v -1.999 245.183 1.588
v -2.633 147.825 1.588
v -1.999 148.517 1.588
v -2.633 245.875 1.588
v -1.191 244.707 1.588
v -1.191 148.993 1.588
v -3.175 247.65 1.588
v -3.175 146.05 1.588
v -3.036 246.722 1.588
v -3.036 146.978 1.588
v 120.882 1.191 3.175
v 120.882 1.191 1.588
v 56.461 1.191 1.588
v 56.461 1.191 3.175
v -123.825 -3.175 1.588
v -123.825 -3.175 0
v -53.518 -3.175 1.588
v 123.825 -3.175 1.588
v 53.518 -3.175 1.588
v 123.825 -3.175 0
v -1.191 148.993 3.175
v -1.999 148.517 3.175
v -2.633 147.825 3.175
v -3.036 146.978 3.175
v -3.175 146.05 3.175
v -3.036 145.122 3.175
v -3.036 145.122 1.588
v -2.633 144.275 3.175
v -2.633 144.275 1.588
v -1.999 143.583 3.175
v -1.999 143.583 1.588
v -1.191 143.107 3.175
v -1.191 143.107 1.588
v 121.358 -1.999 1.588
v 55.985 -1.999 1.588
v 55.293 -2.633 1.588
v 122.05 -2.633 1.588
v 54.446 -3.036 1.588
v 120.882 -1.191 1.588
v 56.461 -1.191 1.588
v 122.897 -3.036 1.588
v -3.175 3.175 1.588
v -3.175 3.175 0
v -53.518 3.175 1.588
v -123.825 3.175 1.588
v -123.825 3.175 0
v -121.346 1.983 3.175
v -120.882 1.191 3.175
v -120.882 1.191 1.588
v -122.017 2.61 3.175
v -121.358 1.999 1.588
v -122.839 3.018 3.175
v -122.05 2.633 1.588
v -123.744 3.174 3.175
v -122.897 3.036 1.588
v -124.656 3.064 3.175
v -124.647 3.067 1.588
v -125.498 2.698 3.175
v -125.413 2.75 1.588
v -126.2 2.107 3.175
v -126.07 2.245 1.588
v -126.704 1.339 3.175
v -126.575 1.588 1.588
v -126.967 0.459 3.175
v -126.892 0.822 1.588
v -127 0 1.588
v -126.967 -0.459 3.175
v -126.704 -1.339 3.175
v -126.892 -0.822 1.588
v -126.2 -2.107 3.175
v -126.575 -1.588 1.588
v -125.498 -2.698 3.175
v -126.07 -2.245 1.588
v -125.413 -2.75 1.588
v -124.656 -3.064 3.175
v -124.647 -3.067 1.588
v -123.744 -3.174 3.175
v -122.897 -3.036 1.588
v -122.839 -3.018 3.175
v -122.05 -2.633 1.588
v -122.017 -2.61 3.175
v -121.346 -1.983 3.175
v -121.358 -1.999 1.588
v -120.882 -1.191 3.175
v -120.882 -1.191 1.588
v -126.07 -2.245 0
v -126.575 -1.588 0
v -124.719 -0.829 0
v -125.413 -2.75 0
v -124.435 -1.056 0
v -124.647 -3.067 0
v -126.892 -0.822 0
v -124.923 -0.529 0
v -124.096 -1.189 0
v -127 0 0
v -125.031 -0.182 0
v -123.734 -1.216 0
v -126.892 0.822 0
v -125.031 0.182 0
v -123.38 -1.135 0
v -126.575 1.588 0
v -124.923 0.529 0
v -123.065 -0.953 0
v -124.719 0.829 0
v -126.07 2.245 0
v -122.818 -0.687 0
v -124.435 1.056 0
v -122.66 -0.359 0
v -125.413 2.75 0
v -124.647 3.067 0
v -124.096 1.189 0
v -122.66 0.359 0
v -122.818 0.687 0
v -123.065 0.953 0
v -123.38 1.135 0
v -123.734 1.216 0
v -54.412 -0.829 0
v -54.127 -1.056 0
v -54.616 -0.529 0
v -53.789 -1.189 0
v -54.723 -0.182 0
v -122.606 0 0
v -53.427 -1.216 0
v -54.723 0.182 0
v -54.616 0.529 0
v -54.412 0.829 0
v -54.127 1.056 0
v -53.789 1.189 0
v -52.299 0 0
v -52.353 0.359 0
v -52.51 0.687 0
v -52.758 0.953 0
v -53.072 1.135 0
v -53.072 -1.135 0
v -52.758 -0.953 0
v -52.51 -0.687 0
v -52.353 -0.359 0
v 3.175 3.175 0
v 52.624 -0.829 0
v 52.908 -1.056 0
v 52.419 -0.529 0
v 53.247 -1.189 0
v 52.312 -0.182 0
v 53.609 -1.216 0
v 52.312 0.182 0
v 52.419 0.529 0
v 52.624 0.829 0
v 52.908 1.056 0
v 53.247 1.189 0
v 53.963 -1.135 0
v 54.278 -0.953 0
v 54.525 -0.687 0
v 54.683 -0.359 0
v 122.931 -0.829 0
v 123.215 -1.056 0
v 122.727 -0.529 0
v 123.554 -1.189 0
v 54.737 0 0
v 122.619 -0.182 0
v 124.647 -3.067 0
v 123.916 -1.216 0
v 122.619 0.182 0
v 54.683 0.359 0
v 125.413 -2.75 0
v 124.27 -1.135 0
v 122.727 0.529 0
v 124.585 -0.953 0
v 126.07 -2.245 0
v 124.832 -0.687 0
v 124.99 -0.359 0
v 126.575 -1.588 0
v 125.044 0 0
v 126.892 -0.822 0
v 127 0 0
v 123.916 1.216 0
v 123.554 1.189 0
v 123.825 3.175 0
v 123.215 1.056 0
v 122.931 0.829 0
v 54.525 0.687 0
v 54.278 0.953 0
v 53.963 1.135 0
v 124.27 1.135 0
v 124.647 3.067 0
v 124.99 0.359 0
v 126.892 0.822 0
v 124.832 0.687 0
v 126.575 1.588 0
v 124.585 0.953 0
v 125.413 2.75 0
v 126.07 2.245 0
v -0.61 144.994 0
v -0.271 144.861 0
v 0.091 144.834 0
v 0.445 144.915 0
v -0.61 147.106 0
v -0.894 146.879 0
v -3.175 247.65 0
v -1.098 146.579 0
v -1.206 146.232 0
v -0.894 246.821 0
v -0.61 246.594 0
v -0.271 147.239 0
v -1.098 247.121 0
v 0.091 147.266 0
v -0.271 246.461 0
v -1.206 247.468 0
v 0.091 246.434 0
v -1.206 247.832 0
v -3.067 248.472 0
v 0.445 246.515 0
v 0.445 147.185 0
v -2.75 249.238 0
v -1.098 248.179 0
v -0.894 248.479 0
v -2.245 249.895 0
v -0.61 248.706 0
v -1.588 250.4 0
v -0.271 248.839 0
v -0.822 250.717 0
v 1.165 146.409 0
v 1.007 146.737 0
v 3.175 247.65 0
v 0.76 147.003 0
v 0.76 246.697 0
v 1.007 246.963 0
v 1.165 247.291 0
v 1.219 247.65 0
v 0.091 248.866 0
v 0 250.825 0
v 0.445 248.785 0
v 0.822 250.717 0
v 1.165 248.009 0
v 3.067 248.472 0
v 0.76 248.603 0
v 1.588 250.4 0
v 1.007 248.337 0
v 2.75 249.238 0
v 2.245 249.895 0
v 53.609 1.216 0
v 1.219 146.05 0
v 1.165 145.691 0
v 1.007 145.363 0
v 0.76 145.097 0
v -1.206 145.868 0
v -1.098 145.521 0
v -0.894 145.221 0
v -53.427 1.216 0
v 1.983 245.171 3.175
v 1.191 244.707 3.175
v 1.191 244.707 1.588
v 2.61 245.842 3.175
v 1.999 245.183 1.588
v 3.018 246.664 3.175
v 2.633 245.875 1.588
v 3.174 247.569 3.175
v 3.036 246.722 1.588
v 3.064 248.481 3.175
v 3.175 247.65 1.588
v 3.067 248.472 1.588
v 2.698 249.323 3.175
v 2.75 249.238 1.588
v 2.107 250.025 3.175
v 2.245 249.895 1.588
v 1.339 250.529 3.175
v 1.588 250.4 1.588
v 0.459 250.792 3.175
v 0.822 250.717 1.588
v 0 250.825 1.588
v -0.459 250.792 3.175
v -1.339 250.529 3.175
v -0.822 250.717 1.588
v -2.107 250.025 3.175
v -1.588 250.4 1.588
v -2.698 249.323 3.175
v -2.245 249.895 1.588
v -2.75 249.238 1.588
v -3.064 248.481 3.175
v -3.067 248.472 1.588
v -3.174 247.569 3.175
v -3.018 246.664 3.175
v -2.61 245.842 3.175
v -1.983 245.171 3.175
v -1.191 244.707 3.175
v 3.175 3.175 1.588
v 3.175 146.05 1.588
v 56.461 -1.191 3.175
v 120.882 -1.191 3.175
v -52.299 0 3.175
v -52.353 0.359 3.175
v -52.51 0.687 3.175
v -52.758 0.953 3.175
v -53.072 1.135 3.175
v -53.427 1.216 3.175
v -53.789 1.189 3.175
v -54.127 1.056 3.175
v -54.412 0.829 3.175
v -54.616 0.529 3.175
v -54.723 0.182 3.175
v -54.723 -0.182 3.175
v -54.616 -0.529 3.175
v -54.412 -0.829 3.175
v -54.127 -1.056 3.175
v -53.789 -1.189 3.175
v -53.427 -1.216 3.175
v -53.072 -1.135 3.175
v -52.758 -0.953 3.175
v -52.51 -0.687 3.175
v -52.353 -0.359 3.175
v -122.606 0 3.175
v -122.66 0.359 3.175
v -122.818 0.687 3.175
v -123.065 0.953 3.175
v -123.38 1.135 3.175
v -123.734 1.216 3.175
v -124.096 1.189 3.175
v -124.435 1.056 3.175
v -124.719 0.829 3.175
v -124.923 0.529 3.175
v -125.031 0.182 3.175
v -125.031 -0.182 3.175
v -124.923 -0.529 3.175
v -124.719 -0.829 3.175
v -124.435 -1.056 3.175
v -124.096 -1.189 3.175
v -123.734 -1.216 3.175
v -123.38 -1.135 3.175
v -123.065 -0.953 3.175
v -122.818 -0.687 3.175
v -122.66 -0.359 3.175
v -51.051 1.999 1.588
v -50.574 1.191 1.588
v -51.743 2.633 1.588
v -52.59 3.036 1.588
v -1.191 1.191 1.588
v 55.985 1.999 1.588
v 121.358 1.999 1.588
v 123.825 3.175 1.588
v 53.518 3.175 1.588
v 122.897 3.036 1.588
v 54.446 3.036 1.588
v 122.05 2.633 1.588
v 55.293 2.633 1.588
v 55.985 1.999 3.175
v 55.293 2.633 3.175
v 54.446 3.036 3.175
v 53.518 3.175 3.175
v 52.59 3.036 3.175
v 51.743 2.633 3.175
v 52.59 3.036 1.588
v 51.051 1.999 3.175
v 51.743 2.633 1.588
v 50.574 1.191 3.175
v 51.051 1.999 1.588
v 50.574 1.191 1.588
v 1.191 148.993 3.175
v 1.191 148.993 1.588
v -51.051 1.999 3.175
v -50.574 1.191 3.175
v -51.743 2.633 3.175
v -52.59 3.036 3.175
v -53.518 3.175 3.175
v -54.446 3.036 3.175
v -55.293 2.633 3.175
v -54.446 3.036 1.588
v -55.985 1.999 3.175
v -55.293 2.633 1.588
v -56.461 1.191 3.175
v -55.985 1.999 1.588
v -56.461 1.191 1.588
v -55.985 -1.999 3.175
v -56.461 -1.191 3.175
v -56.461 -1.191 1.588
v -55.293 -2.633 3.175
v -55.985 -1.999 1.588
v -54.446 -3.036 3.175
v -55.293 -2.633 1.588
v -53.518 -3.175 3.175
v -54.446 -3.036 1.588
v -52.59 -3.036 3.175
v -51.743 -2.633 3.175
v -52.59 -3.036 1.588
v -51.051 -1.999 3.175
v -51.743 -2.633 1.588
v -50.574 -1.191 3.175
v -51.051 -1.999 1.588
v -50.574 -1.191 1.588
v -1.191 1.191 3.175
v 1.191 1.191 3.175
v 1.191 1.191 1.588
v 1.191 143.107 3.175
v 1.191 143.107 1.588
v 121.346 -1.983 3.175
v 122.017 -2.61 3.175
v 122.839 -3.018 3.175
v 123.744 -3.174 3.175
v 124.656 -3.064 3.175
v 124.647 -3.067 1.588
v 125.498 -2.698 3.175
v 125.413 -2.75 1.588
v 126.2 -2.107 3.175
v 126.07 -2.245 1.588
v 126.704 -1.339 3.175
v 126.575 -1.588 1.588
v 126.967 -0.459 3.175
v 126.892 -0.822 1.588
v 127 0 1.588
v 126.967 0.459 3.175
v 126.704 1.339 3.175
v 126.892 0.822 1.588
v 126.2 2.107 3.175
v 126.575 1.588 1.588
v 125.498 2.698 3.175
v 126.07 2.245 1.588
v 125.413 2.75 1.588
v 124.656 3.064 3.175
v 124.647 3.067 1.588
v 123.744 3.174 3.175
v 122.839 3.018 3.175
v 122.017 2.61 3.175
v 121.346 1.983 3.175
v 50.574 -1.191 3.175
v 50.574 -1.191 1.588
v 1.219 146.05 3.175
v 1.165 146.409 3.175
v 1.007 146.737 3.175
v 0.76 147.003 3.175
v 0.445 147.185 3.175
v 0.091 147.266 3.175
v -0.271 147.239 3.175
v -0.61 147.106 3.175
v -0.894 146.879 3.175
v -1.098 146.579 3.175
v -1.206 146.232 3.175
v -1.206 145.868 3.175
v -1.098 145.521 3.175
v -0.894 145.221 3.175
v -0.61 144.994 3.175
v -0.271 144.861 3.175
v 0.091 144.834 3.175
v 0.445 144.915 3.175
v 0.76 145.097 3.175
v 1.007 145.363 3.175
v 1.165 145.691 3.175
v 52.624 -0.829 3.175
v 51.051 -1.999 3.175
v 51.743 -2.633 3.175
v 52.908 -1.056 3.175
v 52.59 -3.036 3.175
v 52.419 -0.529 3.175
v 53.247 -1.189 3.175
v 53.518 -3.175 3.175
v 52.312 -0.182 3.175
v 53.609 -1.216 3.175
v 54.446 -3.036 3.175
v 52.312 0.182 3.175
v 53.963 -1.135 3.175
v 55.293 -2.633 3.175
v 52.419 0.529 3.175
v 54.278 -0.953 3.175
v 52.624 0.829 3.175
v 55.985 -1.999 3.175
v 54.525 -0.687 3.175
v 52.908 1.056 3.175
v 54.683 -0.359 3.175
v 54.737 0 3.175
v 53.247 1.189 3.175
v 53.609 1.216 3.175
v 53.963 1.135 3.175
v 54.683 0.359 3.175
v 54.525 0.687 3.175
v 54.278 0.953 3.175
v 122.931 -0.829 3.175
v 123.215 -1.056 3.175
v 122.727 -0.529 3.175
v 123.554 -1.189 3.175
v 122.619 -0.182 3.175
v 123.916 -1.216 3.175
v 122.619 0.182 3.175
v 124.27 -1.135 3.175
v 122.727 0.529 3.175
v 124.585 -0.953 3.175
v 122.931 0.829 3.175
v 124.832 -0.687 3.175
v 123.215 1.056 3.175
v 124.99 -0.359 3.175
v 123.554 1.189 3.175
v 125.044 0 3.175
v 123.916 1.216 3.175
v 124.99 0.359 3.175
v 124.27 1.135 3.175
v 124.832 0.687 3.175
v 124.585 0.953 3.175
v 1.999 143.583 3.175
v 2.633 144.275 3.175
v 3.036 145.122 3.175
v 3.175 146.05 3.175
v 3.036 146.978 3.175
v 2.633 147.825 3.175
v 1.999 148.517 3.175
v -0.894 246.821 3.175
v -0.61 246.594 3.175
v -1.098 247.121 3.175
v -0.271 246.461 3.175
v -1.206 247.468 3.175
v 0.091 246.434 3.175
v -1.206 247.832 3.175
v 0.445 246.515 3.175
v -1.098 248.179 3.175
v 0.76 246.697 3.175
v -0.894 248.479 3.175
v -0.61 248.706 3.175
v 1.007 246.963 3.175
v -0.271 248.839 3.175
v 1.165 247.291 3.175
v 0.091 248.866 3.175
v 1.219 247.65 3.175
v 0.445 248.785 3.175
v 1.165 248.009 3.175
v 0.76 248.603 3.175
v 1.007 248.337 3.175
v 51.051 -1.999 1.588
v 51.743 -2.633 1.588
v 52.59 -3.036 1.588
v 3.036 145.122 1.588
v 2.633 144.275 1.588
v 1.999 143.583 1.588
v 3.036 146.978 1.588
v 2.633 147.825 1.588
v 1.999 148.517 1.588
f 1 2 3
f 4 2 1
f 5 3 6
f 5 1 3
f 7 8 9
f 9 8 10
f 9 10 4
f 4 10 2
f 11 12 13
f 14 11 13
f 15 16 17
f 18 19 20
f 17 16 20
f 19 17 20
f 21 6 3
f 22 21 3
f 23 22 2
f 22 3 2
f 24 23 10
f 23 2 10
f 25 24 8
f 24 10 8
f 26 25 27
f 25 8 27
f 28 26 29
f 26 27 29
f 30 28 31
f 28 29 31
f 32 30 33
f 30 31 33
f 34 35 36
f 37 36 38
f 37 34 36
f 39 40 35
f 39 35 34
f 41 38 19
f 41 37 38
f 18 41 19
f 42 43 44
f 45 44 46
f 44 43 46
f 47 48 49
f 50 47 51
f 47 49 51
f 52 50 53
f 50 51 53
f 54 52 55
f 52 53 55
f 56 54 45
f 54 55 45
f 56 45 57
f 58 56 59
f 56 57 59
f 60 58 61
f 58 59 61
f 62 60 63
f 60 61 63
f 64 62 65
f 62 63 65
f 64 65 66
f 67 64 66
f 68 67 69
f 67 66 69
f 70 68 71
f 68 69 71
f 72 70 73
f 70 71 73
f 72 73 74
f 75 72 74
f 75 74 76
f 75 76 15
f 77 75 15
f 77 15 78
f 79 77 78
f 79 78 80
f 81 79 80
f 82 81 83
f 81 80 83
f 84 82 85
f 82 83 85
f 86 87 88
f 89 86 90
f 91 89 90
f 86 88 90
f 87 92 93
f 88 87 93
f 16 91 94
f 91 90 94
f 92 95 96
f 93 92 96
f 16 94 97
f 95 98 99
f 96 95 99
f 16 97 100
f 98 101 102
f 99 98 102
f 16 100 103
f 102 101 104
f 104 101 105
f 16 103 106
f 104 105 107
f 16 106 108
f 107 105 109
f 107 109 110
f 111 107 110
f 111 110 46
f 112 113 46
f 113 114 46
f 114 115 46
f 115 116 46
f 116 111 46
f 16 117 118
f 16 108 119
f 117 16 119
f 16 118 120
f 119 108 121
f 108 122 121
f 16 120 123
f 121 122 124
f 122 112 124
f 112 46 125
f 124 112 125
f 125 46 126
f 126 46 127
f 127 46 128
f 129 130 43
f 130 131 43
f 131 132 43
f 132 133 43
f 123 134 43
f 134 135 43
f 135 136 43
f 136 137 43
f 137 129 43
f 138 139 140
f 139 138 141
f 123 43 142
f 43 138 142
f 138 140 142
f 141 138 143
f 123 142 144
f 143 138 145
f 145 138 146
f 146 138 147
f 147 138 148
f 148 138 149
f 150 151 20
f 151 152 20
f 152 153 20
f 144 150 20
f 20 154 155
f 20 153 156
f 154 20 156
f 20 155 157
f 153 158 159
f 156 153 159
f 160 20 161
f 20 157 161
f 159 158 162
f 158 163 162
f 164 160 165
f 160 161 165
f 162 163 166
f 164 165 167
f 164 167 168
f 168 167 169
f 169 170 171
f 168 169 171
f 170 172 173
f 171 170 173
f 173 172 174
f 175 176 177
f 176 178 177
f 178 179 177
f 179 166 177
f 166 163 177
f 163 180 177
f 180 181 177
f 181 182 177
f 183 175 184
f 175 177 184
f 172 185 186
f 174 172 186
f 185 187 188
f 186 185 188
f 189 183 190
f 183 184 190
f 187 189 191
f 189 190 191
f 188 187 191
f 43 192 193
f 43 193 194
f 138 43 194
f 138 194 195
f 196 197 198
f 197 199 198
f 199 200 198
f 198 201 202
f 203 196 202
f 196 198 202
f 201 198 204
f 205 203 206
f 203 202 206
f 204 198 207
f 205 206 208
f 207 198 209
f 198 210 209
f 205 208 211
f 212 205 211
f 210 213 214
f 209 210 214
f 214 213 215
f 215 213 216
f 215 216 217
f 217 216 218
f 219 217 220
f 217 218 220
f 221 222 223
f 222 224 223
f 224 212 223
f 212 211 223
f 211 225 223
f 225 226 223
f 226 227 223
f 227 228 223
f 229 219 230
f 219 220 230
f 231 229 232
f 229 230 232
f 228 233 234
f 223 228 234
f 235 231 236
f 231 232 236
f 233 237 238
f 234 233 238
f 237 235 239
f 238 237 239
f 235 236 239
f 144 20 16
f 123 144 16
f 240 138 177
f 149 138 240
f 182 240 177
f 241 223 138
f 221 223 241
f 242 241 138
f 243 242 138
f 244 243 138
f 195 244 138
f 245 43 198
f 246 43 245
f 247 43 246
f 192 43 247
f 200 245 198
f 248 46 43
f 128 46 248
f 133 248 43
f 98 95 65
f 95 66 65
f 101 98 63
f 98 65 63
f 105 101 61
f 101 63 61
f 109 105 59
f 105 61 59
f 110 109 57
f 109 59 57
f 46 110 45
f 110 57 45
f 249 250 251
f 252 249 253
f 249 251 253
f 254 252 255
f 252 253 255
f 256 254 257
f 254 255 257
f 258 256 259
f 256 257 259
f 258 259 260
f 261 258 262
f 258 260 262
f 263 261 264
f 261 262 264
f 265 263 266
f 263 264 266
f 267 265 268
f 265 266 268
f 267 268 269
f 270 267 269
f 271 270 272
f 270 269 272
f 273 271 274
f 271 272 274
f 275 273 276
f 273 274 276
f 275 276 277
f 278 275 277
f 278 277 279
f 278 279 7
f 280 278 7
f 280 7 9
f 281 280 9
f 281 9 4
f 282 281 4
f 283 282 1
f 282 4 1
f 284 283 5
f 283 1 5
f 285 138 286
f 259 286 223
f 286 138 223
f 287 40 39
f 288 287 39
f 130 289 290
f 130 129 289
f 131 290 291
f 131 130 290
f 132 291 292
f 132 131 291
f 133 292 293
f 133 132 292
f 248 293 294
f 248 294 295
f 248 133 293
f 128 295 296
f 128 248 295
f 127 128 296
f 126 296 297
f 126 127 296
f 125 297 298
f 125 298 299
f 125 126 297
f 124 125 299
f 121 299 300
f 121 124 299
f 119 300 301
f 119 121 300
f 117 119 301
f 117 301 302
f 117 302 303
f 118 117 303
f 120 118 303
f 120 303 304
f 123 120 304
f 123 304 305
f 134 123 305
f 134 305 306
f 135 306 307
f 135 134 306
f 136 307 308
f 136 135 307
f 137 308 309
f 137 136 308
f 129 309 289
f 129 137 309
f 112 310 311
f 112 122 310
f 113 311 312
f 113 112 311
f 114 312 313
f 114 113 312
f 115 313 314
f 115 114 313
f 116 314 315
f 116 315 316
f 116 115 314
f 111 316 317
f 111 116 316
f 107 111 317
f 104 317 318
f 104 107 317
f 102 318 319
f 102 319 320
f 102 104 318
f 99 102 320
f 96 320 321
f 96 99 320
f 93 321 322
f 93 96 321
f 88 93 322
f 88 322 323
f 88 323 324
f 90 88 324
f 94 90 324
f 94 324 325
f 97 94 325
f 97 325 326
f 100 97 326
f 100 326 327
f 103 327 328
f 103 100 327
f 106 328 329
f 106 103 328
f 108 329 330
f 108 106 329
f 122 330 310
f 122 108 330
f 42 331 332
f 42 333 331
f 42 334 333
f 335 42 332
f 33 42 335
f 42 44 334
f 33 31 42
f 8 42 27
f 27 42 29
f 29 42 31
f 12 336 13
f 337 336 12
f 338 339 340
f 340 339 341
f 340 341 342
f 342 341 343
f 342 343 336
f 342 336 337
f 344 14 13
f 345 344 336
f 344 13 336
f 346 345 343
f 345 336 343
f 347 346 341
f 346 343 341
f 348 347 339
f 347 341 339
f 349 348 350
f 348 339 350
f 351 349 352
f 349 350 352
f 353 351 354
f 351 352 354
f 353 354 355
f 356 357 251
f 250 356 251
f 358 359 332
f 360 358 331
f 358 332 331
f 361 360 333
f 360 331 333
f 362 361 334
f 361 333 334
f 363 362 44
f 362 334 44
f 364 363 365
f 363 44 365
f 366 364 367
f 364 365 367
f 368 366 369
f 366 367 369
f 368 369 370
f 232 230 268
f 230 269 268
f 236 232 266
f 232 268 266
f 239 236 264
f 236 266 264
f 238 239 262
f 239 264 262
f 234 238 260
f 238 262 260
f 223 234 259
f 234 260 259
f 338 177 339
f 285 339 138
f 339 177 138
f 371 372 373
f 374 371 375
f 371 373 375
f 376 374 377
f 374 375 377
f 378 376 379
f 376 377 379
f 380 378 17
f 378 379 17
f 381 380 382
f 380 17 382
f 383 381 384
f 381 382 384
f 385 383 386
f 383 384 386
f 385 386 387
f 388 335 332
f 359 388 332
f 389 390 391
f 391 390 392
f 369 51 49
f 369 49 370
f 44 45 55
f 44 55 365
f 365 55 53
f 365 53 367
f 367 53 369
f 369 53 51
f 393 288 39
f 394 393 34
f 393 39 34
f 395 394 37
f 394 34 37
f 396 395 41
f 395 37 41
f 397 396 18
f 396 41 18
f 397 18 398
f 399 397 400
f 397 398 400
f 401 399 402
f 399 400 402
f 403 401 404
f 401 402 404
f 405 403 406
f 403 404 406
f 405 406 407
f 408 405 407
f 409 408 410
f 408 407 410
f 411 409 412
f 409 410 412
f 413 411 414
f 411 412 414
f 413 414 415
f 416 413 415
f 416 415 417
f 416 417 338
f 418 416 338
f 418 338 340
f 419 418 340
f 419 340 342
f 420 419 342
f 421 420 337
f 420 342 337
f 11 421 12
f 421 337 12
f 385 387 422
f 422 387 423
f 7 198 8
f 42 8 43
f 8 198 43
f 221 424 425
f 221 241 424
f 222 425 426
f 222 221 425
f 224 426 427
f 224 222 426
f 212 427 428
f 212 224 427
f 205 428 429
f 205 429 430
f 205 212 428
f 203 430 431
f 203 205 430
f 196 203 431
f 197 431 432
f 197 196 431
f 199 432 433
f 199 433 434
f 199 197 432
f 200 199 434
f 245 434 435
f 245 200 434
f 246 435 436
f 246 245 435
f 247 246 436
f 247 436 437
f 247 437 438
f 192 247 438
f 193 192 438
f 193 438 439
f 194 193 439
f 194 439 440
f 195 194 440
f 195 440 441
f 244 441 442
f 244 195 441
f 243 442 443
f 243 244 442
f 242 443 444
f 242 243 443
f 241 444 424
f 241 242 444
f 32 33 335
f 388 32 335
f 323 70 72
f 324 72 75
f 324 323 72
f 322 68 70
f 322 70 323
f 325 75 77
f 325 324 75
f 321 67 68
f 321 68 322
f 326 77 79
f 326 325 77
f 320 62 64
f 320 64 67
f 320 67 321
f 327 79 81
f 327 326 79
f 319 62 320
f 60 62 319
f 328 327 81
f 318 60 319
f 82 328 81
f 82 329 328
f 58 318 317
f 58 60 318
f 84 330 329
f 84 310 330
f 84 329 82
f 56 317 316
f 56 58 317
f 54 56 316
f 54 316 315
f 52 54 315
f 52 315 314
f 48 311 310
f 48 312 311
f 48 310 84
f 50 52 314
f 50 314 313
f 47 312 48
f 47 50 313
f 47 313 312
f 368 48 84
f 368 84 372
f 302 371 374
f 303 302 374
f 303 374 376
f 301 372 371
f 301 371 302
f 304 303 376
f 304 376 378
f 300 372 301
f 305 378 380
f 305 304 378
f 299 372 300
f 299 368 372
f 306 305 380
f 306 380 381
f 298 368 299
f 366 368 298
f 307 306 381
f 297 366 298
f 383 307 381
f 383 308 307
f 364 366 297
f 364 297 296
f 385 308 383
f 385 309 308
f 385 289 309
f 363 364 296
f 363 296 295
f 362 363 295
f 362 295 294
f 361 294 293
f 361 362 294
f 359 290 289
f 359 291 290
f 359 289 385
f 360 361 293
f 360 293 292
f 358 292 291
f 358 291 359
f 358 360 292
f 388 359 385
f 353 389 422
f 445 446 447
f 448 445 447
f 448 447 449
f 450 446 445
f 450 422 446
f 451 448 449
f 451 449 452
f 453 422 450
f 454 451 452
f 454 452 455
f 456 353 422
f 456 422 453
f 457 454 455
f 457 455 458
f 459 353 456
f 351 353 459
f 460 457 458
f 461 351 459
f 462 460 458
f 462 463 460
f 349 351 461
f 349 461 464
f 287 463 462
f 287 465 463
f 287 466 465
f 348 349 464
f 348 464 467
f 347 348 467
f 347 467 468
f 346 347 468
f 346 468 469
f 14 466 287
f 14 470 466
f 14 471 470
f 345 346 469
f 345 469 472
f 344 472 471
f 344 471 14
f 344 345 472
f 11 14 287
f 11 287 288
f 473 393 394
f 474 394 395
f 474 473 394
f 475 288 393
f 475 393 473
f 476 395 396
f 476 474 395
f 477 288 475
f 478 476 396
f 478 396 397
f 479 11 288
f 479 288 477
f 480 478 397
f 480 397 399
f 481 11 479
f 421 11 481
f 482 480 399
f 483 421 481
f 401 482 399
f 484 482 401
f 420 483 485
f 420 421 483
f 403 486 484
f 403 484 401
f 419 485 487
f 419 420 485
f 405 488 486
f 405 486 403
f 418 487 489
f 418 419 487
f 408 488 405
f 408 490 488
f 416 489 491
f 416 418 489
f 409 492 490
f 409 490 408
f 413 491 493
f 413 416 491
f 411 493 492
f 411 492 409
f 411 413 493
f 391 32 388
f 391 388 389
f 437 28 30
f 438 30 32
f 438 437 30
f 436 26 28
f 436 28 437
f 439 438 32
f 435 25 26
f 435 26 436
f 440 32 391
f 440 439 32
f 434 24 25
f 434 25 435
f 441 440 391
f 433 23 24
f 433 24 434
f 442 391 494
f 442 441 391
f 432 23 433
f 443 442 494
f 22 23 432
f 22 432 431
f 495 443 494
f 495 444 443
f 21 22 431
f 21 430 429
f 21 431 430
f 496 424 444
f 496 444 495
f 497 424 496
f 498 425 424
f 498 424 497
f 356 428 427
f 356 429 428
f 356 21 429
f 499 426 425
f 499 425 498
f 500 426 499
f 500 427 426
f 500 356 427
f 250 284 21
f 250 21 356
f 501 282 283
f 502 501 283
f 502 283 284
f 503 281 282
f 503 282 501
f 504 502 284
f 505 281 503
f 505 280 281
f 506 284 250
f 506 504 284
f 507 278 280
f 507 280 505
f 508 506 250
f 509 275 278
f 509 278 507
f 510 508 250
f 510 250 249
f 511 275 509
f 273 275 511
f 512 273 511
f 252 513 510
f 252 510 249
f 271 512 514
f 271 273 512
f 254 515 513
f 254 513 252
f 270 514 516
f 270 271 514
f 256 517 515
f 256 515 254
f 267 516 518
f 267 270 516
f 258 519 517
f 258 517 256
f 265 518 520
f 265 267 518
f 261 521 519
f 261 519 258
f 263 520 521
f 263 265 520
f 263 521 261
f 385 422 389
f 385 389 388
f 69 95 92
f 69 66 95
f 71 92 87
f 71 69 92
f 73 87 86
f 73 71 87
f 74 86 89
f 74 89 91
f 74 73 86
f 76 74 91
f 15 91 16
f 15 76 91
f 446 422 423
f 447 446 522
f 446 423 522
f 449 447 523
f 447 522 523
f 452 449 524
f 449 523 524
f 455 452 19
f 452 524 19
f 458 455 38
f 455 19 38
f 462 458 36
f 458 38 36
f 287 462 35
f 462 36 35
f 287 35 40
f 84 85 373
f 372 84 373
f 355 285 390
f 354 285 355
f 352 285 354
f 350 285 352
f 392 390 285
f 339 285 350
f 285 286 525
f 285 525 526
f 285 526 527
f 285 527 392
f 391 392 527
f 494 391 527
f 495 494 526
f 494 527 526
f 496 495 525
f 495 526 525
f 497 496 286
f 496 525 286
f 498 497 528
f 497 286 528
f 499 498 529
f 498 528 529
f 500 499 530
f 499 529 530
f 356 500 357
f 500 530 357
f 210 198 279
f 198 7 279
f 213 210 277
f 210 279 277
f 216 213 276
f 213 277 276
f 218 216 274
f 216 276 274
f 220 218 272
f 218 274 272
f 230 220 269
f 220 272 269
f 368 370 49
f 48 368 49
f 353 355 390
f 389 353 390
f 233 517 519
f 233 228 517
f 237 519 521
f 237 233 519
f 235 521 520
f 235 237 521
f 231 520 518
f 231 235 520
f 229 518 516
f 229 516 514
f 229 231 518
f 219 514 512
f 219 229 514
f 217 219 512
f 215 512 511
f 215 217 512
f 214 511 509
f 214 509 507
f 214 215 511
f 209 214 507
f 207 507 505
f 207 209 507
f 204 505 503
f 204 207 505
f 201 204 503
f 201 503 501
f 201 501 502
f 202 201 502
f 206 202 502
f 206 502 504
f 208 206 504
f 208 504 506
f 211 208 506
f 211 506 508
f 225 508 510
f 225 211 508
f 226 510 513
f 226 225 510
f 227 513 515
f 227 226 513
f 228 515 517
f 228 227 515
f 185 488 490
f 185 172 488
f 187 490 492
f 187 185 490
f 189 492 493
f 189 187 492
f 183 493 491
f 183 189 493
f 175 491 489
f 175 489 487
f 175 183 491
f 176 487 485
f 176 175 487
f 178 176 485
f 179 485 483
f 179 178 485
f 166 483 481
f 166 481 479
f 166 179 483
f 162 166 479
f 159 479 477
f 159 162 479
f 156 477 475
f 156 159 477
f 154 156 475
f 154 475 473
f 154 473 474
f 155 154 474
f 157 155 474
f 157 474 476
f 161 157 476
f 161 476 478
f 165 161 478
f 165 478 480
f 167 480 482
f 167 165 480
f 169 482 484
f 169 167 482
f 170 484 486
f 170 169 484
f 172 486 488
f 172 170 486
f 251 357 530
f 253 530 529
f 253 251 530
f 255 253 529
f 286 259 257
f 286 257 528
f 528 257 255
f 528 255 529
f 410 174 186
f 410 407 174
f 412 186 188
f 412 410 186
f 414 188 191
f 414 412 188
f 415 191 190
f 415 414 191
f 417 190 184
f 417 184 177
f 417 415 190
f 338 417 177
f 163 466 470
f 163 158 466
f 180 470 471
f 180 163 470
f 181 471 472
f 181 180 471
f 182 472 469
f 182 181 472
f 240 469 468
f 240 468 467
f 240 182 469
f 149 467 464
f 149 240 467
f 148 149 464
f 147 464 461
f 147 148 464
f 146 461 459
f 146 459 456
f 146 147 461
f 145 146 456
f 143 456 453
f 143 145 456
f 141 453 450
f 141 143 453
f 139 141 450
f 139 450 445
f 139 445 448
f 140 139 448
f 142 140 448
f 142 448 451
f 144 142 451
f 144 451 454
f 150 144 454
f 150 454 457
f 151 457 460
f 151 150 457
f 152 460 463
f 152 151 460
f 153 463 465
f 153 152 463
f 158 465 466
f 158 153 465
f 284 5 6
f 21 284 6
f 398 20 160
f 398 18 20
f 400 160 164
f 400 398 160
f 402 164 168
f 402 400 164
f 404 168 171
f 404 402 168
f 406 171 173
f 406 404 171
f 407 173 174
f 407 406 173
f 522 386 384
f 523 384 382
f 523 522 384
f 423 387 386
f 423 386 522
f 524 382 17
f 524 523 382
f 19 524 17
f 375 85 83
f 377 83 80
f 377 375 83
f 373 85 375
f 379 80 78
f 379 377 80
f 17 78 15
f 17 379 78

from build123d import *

# Parameters (mm, degrees)
F0_R     = 1.2192
F1_DEPTH = 1.5875
F2_R     = 3.17499
F3_R     = 1.2192
F4_DEPTH = 1.5875


# Not quite as in the source:
# - a fillet or chamfer is up to 0.001 mm smaller than in the source, because OpenCascade refuses the exact size


with BuildPart() as f1:
    # F0 (on Top) → F1 (new body)
    with BuildSketch(Plane.XY):
        Polygon((-127, 3.175), (-127, -3.175), (127, -3.175), (127, 3.175), (3.175, 3.175), (3.175, 250.825), (-3.175, 250.825), (-3.175, 3.175), align=None)
        with Locations((-123.825, 0)):
            Circle(F0_R, mode=Mode.SUBTRACT)
        with Locations((-53.5178, 0)):
            Circle(F0_R, mode=Mode.SUBTRACT)
        with Locations((53.5178, 0)):
            Circle(F0_R, mode=Mode.SUBTRACT)
        with Locations((123.825, 0)):
            Circle(F0_R, mode=Mode.SUBTRACT)
        with Locations((0, 146.05)):
            Circle(F0_R, mode=Mode.SUBTRACT)
        with Locations((0, 247.65)):
            Circle(F0_R, mode=Mode.SUBTRACT)
    extrude(amount=F1_DEPTH)

    # F2 (radius 3.175 in the source; OpenCascade refuses exactly that, so slightly less here)
    f2_edges = [f1.edges().sort_by_distance(p)[0] for p in [
        (-127, -3.175, 0.79375),
        (-127, 3.175, 0.79375),
        (127, 3.175, 0.79375),
        (127, -3.175, 0.79375),
        (-3.175, 250.825, 0.79375),
        (3.175, 250.825, 0.79375),
    ]]
    fillet(f2_edges, radius=F2_R)

    # F3 (on face) → F4 (join)
    with BuildSketch(Plane.XY.offset(1.5875)):
        with BuildLine():
            Line((-56.4611037746, 1.190625), (-120.8816962254, 1.190625))
            ThreePointArc((-120.8816962254, 1.190625), (-127, 0), (-120.8816962254, -1.190625))
            Line((-120.8816962254, -1.190625), (-56.4611037746, -1.190625))
            ThreePointArc((-56.4611037746, -1.190625), (-53.5178, -3.175), (-50.5744962254, -1.190625))
            Line((-50.5744962254, -1.190625), (50.5744962254, -1.190625))
            ThreePointArc((50.5744962254, -1.190625), (53.5178, -3.175), (56.4611037746, -1.190625))
            Line((56.4611037746, -1.190625), (120.8816962254, -1.190625))
            ThreePointArc((120.8816962254, -1.190625), (127, 0), (120.8816962254, 1.190625))
            Line((120.8816962254, 1.190625), (56.4611037746, 1.190625))
            ThreePointArc((56.4611037746, 1.190625), (53.5178, 3.175), (50.5744962254, 1.190625))
            Line((50.5744962254, 1.190625), (1.190625, 1.190625))
            Line((1.190625, 1.190625), (1.190625, 143.1066962254))
            ThreePointArc((1.190625, 143.1066962254), (3.175, 146.05), (1.190625, 148.9933037746))
            Line((1.190625, 148.9933037746), (1.190625, 244.7066962254))
            ThreePointArc((1.190625, 244.7066962254), (0, 250.825), (-1.190625, 244.7066962254))
            Line((-1.190625, 244.7066962254), (-1.190625, 148.9933037746))
            ThreePointArc((-1.190625, 148.9933037746), (-3.175, 146.05), (-1.190625, 143.1066962254))
            Line((-1.190625, 143.1066962254), (-1.190625, 1.190625))
            Line((-1.190625, 1.190625), (-50.5744962254, 1.190625))
            ThreePointArc((-50.5744962254, 1.190625), (-53.5178, 3.175), (-56.4611037746, 1.190625))
        make_face()
        with Locations((-123.825, 0)):
            Circle(F3_R, mode=Mode.SUBTRACT)
        with Locations((-53.5178, 0)):
            Circle(F3_R, mode=Mode.SUBTRACT)
        with Locations((53.5178, 0)):
            Circle(F3_R, mode=Mode.SUBTRACT)
        with Locations((123.825, 0)):
            Circle(F3_R, mode=Mode.SUBTRACT)
        with Locations((0, 146.05)):
            Circle(F3_R, mode=Mode.SUBTRACT)
        with Locations((0, 247.65)):
            Circle(F3_R, mode=Mode.SUBTRACT)
    extrude(amount=F4_DEPTH)


solid = f1.part
